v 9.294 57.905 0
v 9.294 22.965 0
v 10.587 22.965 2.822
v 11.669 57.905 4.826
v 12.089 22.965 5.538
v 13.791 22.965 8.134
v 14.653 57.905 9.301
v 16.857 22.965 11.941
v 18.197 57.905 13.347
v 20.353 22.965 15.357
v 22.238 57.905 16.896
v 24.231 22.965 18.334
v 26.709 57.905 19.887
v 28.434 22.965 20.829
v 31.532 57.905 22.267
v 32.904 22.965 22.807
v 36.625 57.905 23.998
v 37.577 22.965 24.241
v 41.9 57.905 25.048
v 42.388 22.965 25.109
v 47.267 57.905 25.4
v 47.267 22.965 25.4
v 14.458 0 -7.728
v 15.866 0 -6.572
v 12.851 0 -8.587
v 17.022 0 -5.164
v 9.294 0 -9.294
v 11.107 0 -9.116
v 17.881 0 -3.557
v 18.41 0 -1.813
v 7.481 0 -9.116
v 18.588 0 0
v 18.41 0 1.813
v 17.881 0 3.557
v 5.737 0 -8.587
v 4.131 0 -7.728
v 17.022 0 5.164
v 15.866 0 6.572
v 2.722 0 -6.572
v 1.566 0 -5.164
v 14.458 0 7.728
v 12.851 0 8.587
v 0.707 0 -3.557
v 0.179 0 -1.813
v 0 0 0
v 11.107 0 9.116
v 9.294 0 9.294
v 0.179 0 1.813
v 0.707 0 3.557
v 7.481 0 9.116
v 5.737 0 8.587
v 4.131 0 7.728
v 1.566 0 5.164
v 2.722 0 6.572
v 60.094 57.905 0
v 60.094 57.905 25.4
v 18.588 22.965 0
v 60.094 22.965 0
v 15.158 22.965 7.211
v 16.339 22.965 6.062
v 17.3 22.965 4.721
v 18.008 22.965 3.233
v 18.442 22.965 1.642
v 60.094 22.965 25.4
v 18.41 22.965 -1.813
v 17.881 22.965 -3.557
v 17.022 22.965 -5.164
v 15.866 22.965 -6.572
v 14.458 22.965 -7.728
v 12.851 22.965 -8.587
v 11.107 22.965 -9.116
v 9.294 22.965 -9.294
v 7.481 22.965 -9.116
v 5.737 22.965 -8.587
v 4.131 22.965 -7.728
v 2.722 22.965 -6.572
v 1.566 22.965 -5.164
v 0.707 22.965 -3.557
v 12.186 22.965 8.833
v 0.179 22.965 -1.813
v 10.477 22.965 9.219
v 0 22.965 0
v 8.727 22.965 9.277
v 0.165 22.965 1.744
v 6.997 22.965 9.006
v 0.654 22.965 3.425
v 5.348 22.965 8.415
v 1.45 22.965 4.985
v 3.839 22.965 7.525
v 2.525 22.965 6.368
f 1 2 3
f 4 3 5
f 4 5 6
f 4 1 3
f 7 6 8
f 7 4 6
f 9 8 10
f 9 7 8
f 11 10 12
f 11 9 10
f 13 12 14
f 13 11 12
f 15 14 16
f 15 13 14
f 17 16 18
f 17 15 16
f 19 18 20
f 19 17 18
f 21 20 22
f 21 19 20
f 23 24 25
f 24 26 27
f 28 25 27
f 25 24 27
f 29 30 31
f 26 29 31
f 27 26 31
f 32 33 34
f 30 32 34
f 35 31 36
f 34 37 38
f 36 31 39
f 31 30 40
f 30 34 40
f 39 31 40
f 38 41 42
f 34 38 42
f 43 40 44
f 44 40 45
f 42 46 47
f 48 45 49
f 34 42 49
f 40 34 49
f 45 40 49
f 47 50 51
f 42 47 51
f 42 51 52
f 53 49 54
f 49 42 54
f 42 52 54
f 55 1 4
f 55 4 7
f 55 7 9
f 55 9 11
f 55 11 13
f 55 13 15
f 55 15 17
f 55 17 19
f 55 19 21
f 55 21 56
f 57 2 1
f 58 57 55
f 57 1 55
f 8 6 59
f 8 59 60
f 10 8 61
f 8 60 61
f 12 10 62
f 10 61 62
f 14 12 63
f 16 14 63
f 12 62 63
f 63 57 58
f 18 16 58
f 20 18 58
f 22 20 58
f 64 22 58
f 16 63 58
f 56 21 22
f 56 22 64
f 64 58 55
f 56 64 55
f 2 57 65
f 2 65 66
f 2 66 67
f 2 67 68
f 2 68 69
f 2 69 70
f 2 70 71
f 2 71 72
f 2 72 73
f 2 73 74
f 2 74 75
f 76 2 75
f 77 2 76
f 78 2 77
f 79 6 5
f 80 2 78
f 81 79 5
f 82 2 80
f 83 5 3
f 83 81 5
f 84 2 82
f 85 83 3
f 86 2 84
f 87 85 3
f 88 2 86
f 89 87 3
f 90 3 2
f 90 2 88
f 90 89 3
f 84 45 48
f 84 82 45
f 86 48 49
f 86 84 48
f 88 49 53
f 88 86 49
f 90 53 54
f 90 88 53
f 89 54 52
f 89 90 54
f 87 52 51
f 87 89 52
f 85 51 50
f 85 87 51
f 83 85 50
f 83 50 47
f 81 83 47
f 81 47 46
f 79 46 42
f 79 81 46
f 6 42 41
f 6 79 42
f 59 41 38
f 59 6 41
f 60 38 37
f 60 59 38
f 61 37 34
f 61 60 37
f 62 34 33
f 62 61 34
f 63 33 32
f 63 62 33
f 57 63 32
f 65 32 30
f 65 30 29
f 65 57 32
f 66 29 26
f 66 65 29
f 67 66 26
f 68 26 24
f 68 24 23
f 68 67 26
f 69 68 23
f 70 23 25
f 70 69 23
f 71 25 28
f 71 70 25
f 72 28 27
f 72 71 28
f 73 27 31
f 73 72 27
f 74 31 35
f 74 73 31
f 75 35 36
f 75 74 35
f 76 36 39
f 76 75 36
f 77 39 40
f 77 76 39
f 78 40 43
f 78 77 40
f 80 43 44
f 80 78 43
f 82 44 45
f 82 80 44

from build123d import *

# Parameters (mm, degrees)
F0_W        = 50.8
F0_H        = 34.9398194141
F1_DEPTH    = 25.4
F0_W_2      = 9.2941272077
F0_H_2      = 22.9654247603
F3_T1_DEPTH = 129.872769086


# Not quite as in the source:
# - a fillet or chamfer that OpenCascade refuses, or shapes differently, is made with other operations: its cross-section is extruded or revolved along the edge and cut away or added


with BuildPart() as f1:
    # F0 (on Top) → F1 (new body)
    with BuildSketch(Plane.XY):
        with Locations((34.6941272077, 40.4353344673)):
            Rectangle(F0_W, F0_H)
    extrude(amount=F1_DEPTH)

    # F0 (on Top) → F2 (revolve)
    with BuildSketch(Plane.XY):
        with Locations((4.6470636039, 11.4827123801)):
            Rectangle(F0_W_2, F0_H_2)
    revolve(axis=Axis((9.2941272077, 11.4827123801, 0), (0, 1, 0)))

    # F3: fillet of radius 41.0850864045 on 1 edges, made by hand

    # F3_s2 → F3_t1 (cut)
    with BuildSketch(Plane.XZ.offset(-152.8381938463)):
        with BuildLine():
            ThreePointArc((9.2941272077, 0), (24.4247897604, 18.4646387412), (47.2673070765, 25.4))
            Line((47.2673070765, 25.4), (9.2941272077, 25.4))
            Line((9.2941272077, 25.4), (9.2941272077, 0))
        make_face()
    extrude(amount=F3_T1_DEPTH, mode=Mode.SUBTRACT)


solid = f1.part
